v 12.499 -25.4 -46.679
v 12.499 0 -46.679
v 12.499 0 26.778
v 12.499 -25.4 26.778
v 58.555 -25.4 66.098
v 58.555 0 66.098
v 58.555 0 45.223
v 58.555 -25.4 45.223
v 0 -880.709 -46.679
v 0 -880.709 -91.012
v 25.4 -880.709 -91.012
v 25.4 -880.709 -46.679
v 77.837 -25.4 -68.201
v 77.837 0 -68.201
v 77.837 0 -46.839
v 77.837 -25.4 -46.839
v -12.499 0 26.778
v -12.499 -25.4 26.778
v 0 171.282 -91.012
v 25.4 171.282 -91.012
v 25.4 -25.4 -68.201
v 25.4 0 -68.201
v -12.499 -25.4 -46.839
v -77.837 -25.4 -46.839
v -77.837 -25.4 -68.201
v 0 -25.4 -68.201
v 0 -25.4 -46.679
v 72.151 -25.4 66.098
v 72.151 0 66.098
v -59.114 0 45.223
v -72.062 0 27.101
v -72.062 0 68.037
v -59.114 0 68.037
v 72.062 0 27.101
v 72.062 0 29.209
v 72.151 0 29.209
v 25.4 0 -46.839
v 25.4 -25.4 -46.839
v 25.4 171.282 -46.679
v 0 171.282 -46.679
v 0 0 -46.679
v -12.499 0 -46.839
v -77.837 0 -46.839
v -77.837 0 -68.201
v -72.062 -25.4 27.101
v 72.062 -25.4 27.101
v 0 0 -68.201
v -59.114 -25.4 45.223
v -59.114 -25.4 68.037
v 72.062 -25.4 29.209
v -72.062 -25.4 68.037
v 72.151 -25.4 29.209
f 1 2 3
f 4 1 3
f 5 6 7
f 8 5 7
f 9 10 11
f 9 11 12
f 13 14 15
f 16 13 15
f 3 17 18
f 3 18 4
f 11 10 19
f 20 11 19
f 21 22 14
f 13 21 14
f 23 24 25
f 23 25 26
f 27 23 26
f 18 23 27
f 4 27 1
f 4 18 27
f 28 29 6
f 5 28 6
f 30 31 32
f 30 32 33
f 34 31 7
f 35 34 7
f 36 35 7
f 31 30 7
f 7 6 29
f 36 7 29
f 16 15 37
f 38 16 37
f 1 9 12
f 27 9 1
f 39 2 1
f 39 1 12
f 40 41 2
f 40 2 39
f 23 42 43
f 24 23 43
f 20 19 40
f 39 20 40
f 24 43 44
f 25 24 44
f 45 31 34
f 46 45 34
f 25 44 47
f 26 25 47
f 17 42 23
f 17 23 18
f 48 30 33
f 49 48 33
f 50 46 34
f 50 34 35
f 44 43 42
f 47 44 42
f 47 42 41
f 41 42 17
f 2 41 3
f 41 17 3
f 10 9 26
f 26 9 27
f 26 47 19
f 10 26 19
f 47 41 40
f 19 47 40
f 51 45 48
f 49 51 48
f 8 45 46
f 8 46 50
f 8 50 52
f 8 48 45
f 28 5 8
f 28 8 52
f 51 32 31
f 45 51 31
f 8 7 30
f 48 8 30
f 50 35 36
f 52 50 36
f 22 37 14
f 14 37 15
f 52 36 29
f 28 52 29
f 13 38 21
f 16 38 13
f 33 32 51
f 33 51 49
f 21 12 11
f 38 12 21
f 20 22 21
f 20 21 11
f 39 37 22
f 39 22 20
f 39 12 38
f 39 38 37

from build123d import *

# Parameters (mm, degrees)
F0_W     = 24.9986350536
F0_H     = 73.6169979911
F0_H_2   = 20.8740851838
F1_DEPTH = 25.4
F0_W_2   = 12.948423624
F0_H_3   = 22.8137746453
F0_H_4   = 1.4562010765
F0_W_3   = 13.506911695
F0_H_5   = 16.0137787461
F2_W     = 1051.9908871502
F2_H     = 44.3331450224
F3_DEPTH = 25.4


# Not quite as in the source:
# - a feature of the source that left no trace in its solid (it failed there, or was rolled back) is left out


with BuildPart() as f1:
    # F0 (on Front) → F1 (new body)
    with BuildSketch(Plane.XZ):
        Polygon((-12.4993175268, -46.8391307633), (-77.8370201588, -46.8391307633), (-77.8370201588, -68.2005307633), (77.8370201588, -68.2005307633), (77.8370201588, -46.8391307633), (12.4993175268, -46.8391307633), (12.4993175268, -67.7132159472), (-12.4993175268, -67.7132159472), align=None)
        with Locations((0, -10.0306317678)):
            Rectangle(F0_W, F0_H)
        with Locations((0, -57.2761733552)):
            Rectangle(F0_W, F0_H_2)
    extrude(amount=F1_DEPTH)

    # F2 (on Right) → F3 (join)
    with BuildSketch(Plane.YZ):
        with Locations((-354.7138301656, -68.8458159566)):
            Rectangle(F2_W, F2_H)
    extrude(amount=F3_DEPTH)


with BuildPart() as f1b:
    # F0 (on Front) → F1, piece 2 (new body)
    with BuildSketch(Plane.XZ):
        with Locations((-65.5878484249, 56.6299296916)):
            Rectangle(F0_W_2, F0_H_3)
        with Locations((-65.5878484249, 44.4949418306)):
            Rectangle(F0_W_2, F0_H_4)
        Polygon((58.5551485419, 45.2230423689), (-59.1136366129, 45.2230423689), (-59.1136366129, 43.7668412924), (-72.0620602369, 43.7668412924), (-72.0620602369, 27.1014645696), (72.0620602369, 27.1014645696), (72.0620602369, 29.2092636228), (58.5551485419, 29.2092636228), align=None)
        Polygon((58.5551485419, 66.097907722), (58.5551485419, 45.2230423689), (72.0620602369, 45.2230423689), (72.0620602369, 29.2092636228), (72.1509829164, 29.2092636228), (72.1509829164, 66.097907722), align=None)
        with Locations((65.3086043894, 37.2161529958)):
            Rectangle(F0_W_3, F0_H_5)
    extrude(amount=F1_DEPTH)


solid = Compound([f1.part, f1b.part])
